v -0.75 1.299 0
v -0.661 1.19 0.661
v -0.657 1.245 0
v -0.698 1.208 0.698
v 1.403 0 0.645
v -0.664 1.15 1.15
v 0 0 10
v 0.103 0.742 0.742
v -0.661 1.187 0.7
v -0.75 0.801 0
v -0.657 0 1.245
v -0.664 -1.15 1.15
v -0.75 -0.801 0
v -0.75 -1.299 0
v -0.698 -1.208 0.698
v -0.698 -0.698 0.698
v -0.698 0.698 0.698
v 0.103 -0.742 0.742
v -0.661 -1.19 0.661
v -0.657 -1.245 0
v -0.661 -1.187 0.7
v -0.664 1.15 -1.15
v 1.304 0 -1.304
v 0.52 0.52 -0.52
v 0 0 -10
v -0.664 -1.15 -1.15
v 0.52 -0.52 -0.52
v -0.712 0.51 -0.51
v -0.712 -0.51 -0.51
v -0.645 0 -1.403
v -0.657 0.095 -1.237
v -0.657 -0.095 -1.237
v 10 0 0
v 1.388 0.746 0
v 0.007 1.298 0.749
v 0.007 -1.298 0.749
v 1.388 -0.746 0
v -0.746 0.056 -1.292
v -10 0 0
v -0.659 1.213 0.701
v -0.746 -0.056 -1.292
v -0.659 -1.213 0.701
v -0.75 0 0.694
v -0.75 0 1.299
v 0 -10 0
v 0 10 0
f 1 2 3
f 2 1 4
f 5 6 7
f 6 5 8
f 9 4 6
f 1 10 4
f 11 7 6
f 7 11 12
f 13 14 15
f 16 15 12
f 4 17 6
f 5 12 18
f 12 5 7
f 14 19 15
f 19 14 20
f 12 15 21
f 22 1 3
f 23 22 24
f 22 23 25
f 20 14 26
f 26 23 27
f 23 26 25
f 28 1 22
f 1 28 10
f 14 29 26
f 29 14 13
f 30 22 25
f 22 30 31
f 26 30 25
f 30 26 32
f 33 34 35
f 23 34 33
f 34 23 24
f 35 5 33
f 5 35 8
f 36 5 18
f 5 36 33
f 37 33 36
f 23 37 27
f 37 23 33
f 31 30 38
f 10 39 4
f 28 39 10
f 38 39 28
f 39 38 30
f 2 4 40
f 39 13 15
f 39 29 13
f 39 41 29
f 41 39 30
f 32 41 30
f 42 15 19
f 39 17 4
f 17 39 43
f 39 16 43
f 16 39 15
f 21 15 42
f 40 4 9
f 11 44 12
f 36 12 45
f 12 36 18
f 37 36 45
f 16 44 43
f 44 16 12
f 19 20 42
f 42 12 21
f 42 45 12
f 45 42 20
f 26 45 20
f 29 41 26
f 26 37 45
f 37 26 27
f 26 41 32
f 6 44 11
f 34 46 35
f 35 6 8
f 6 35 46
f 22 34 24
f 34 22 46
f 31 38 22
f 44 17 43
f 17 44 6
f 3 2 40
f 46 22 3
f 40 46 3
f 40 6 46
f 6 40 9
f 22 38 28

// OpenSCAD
torpedo_radius = 10;
torpedo_fatness = 1.5;

module tetrahedron(radius, height)
{
	cylinder(h = height, r1 = radius, r2 = 0, center = false);
}

module spike()
{
	union() {
		tetrahedron(torpedo_fatness, torpedo_radius);
		mirror([0, 0, 1])
			tetrahedron(torpedo_fatness, torpedo_radius);
	}
}


module torpedo1()
{
	union() {
		spike();
		rotate(a = 90, v = [0, 1, 0])
			spike();
		rotate(a = 90, v = [1, 0, 0])
			spike();
	}
}

module torpedo()
{
	union() {
		torpedo1();
		rotate(a = 45, v = [1, 0, 0])
			rotate(a = 45, v = [0, 1, 1])
					torpedo1();
	}
}

$fn = 3;
torpedo1();
